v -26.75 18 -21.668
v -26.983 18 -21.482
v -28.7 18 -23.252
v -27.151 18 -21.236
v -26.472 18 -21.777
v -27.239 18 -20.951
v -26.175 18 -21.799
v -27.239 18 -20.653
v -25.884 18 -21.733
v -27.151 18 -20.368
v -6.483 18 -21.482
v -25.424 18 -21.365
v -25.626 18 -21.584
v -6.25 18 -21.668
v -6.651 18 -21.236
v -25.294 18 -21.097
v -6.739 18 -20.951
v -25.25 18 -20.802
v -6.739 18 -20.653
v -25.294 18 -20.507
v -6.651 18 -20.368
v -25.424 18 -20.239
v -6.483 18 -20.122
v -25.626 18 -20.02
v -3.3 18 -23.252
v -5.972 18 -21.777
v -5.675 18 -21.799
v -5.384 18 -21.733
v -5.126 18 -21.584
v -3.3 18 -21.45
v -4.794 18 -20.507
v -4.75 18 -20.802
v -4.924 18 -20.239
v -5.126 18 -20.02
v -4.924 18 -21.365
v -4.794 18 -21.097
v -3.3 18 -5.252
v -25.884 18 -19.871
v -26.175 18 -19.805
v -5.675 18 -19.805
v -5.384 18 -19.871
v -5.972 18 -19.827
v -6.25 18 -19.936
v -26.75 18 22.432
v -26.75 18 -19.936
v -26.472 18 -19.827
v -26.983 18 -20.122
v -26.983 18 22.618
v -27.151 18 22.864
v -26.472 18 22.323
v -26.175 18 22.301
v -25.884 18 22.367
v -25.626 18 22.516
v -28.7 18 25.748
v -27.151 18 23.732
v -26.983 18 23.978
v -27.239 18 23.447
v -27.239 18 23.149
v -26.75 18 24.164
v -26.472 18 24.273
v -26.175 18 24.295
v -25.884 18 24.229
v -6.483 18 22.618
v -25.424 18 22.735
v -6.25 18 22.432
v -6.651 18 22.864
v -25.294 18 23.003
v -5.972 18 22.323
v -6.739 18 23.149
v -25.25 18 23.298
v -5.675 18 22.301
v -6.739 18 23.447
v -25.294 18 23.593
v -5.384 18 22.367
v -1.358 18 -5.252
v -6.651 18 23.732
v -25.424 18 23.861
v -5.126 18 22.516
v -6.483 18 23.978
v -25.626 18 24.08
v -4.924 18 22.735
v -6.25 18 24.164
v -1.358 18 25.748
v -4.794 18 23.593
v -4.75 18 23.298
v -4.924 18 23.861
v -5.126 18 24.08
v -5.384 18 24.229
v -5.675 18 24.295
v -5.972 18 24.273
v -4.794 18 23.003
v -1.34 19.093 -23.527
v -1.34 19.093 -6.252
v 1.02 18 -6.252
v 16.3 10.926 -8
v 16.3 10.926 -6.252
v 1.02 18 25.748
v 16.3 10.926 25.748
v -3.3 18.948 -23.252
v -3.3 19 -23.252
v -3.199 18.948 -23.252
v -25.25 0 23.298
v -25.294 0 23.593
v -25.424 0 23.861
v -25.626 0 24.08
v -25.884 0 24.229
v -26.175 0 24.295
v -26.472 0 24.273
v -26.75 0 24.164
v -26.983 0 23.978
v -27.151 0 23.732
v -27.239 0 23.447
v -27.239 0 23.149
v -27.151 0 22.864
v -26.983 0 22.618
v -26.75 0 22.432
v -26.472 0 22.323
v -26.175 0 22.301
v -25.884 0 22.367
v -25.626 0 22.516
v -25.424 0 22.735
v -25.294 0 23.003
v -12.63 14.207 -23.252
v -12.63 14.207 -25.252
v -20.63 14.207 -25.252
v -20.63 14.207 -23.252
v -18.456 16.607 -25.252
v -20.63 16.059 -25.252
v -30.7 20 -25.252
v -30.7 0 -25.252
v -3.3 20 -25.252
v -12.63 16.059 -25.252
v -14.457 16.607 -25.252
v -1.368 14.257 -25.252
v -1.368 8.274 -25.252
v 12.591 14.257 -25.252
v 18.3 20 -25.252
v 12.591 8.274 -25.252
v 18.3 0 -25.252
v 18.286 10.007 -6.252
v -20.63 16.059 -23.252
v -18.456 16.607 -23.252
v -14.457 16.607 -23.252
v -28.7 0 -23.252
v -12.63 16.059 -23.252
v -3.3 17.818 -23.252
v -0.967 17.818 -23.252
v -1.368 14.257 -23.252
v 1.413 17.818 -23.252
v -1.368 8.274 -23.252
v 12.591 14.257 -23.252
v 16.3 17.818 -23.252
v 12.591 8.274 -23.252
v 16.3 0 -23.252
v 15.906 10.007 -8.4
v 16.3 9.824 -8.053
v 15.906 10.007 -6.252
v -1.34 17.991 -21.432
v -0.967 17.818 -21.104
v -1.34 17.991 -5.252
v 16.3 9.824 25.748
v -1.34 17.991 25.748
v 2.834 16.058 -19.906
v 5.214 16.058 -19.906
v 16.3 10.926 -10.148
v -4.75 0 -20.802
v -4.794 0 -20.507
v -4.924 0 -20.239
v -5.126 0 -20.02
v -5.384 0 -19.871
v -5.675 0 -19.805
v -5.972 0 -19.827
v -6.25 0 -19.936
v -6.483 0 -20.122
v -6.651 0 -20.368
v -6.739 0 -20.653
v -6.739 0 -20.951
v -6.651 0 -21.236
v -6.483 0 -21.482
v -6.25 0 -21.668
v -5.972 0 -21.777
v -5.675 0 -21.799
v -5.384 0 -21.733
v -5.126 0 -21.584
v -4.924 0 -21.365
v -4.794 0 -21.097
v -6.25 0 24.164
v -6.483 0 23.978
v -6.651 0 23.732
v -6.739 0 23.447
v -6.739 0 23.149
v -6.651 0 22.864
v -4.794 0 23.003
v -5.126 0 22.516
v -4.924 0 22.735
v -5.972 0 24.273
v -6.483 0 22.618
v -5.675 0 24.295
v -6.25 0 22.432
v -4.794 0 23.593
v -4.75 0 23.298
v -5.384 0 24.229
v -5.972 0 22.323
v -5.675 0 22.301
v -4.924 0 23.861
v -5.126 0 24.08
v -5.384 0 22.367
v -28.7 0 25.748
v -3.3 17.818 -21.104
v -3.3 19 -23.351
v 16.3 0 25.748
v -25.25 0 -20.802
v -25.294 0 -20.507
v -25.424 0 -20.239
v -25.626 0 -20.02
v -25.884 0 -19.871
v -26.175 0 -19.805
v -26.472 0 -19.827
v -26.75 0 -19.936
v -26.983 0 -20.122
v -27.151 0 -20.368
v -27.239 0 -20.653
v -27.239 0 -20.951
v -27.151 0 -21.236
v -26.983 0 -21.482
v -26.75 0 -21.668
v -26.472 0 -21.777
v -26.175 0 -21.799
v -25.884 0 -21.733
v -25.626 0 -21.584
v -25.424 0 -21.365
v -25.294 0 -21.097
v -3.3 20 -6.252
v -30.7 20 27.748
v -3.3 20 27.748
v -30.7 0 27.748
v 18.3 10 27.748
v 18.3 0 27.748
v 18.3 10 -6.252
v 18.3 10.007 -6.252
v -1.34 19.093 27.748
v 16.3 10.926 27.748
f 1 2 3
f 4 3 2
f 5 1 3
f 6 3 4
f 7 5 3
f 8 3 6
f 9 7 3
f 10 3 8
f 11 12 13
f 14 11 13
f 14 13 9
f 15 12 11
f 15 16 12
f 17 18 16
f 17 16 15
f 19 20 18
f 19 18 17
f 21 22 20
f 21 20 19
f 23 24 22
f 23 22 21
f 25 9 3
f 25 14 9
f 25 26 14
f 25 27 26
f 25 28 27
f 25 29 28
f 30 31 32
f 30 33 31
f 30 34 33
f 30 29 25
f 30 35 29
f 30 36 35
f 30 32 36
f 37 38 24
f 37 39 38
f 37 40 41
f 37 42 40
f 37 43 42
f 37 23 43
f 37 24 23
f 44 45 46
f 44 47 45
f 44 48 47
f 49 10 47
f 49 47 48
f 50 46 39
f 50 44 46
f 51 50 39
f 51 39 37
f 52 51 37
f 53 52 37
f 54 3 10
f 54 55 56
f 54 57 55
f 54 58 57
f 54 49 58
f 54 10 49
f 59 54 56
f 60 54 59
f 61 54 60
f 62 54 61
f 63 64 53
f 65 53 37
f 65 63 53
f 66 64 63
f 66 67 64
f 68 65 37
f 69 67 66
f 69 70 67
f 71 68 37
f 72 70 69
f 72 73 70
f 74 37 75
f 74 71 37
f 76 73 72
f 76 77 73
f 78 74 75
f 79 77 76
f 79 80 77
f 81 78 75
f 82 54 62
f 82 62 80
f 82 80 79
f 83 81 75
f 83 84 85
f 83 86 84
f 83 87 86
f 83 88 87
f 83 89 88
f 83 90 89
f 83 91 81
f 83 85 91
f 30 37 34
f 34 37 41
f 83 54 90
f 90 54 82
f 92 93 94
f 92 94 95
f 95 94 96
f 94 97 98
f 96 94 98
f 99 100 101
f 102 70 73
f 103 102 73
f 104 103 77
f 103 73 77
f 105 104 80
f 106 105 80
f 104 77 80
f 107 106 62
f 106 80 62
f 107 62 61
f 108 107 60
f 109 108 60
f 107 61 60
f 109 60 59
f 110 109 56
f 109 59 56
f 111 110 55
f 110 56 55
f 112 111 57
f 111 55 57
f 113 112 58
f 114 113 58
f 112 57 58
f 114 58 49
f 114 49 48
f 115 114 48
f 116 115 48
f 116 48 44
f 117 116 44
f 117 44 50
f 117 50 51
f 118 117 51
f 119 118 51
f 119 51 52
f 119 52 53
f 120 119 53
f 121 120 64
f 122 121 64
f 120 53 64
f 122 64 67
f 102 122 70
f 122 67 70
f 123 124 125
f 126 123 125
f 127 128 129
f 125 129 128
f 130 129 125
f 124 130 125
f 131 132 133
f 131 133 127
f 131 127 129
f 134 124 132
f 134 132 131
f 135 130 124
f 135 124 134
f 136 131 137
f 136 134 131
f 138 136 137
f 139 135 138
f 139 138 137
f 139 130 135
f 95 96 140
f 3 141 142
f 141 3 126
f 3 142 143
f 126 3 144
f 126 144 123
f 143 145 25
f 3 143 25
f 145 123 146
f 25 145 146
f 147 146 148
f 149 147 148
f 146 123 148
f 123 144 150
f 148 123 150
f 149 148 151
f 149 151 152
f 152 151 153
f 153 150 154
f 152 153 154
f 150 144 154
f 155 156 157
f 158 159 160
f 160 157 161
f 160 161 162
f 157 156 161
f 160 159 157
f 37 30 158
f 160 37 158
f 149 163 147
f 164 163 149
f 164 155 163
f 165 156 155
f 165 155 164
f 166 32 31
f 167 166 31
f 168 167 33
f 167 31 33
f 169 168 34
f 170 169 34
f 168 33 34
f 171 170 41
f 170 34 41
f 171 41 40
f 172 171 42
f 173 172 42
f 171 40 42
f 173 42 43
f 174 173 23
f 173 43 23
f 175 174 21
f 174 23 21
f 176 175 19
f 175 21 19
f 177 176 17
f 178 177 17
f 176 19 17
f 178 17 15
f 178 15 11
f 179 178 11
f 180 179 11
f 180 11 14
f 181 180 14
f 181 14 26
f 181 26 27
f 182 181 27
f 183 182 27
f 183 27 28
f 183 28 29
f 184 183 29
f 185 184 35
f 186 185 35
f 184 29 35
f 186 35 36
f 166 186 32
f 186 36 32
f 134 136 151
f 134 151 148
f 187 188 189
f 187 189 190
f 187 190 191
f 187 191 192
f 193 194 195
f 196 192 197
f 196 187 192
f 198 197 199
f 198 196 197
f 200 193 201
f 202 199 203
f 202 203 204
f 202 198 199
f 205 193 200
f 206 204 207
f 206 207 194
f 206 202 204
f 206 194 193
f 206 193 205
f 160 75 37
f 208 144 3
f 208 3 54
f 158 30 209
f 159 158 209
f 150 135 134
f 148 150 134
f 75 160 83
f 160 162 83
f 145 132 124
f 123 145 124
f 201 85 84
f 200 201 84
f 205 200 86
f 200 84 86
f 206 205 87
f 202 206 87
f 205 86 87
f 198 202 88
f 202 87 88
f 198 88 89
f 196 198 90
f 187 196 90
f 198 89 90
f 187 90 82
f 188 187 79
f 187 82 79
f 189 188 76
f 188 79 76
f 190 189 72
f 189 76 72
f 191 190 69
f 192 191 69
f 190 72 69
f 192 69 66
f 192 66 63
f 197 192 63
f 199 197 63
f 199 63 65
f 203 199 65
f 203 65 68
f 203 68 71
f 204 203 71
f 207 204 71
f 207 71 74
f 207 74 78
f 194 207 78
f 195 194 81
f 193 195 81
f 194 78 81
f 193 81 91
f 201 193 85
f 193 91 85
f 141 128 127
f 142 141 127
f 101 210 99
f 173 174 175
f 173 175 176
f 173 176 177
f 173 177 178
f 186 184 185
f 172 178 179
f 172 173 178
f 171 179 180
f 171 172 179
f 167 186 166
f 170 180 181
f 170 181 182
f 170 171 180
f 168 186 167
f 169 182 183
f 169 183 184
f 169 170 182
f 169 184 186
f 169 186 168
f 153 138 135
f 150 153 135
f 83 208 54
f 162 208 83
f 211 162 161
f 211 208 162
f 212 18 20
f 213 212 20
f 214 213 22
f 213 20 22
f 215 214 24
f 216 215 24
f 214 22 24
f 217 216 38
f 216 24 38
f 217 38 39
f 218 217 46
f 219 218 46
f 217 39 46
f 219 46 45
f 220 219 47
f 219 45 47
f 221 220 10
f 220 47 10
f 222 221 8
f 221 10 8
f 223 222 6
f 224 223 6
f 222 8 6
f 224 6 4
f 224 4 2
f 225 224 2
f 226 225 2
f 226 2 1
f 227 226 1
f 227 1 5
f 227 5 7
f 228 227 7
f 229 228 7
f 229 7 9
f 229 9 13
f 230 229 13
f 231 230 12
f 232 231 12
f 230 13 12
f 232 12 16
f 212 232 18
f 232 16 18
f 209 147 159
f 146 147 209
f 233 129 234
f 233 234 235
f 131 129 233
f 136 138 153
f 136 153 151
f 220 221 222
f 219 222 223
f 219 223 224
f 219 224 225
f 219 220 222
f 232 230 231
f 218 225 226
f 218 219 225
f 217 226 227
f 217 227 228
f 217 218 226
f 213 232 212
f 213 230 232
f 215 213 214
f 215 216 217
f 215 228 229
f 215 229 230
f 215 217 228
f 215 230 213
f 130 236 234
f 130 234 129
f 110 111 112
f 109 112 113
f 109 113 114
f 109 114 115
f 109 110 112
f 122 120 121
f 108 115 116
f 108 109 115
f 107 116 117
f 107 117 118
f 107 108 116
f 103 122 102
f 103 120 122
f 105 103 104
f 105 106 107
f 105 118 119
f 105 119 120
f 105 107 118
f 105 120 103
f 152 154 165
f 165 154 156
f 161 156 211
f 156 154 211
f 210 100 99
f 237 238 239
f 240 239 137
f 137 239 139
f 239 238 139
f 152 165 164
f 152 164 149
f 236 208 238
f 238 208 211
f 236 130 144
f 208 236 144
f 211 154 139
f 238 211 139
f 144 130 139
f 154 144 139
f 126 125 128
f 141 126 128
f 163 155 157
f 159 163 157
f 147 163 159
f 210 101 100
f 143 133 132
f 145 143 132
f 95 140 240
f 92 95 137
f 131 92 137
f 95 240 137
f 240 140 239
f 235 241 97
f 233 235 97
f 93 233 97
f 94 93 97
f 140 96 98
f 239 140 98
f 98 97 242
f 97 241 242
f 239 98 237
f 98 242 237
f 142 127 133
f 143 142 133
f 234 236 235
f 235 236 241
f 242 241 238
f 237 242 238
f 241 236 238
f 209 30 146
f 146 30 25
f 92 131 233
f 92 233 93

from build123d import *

# Parameters (mm, degrees)
SKETCH1_W           = 49
SKETCH1_H           = 53
BOSS_EXTRUDE1_DEPTH = 20
SKETCH3_W           = 45
SKETCH3_H           = 49
CUT_EXTRUDE1_DEPTH  = 18
CUT_EXTRUDE2_DEPTH  = 34
CUT_EXTRUDE3_DEPTH  = 21.6
BOSS_EXTRUDE4_DEPTH = 53
BOSS_EXTRUDE5_DEPTH = 21.6
CUT_EXTRUDE4_DEPTH  = 18
CUT_EXTRUDE5_DEPTH  = 18
BOSS_EXTRUDE6_DEPTH = 18
SKETCH16_R          = 1
BOSS_EXTRUDE7_DEPTH = 18
SKETCH17_W          = 13.959273649
SKETCH17_H          = 5.98254585
CUT_EXTRUDE7_DEPTH  = 2


with BuildPart() as part:
    # Sketch1 → Boss-Extrude1 (new body)
    with BuildSketch(Plane(origin=(0, 0, 0), x_dir=(1, 0, 0), z_dir=(0, 1, 0))):
        with Locations((-6.199798715, -1.247894993)):
            Rectangle(SKETCH1_W, SKETCH1_H)
    extrude(amount=BOSS_EXTRUDE1_DEPTH)

    # Sketch3 → Cut-Extrude1 (cut)
    with BuildSketch(Plane.XZ):
        with Locations((-6.199798715, 1.247894993)):
            Rectangle(SKETCH3_W, SKETCH3_H)
    extrude(amount=-CUT_EXTRUDE1_DEPTH, mode=Mode.SUBTRACT)

    # Sketch4 → Cut-Extrude2 (cut)
    with BuildSketch(Plane.XY.offset(27.747894993)):
        Polygon((18.300201285, 20), (-3.299798715, 20), (18.300201285, 10), align=None)
    extrude(amount=-CUT_EXTRUDE2_DEPTH, mode=Mode.SUBTRACT)

    # Sketch6 → Cut-Extrude3 (cut)
    with BuildSketch(Plane(origin=(18.300201285, 0, 0), x_dir=(0, 0, -1), z_dir=(1, 0, 0))):
        Polygon((6.252105007, 10.006685103), (25.252105007, 20), (6.252105007, 20), align=None)
    extrude(amount=-CUT_EXTRUDE3_DEPTH, mode=Mode.SUBTRACT)

    # Sketch8 → Boss-Extrude4 (add)
    with BuildSketch(Plane.XY.offset(27.747894993)):
        Polygon((-1.339670196, 17.990564534), (-3.299798715, 19), (-3.299798715, 20), (-1.339670196, 19.092533093), (16.300201285, 10.925925926), (18.300201285, 10), (18.300201285, 8.793988713), (16.300201285, 9.823957367), align=None)
    extrude(amount=-BOSS_EXTRUDE4_DEPTH)

    # Sketch11 → Boss-Extrude5 (add)
    with BuildSketch(Plane(origin=(18.300201285, 0, 0), x_dir=(0, 0, -1), z_dir=(1, 0, 0))):
        Polygon((25.252105007, 20), (6.252105007, 10.006685103), (8.400320892, 10.006685103), (25.252105007, 18.870115905), align=None)
    extrude(amount=-BOSS_EXTRUDE5_DEPTH)

    # Sketch12 → Cut-Extrude4 (cut)
    with BuildSketch(Plane.XY.offset(-23.252105007)):
        Polygon((-3.299798715, 17.818188021), (-3.299798715, 10.006685103), (15.905509375, 10.006685103), (-0.967336928, 17.818188021), align=None)
    extrude(amount=CUT_EXTRUDE4_DEPTH, mode=Mode.SUBTRACT)

    # Sketch13 → Cut-Extrude5 (cut)
    with BuildSketch(Plane.ZY.offset(-16.300201285)):
        Polygon((-23.252105007, 17.818188021), (-23.252105007, 9.823957367), (-19.905888942, 9.823957367), (-8.052905944, 9.823957367), (-19.905888942, 16.058199029), align=None)
    extrude(amount=CUT_EXTRUDE5_DEPTH, mode=Mode.SUBTRACT)

    # Sketch15 → Boss-Extrude6 (add)
    with BuildSketch(Plane.XY.offset(-23.252105007)):
        Polygon((-3.299798715, 19), (-3.299798715, 18), (-1.339670196, 17.990564534), align=None)
    extrude(amount=BOSS_EXTRUDE6_DEPTH)

    # Sketch16 → Boss-Extrude7 (add)
    with BuildSketch(Plane.XZ.offset(-18)):
        with Locations((-26.249798715, 23.297894993)):
            Circle(SKETCH16_R)
        with Locations((-5.749798715, 23.297894993)):
            Circle(SKETCH16_R)
        with Locations((-26.249798715, -20.802105007)):
            Circle(SKETCH16_R)
        with Locations((-5.749798715, -20.802105007)):
            Circle(SKETCH16_R)
    extrude(amount=BOSS_EXTRUDE7_DEPTH)

    # Sketch17 → Cut-Extrude7 (cut)
    with BuildSketch(Plane(origin=(0, 0, -25.252105007), x_dir=(-1, 0, 0), z_dir=(0, 0, -1))):
        Polygon((14.456637368, 16.607010477), (12.63034375, 16.059122392), (12.63034375, 14.207010477), (20.63034375, 14.207010477), (20.63034375, 16.059122392), (18.456257111, 16.607010477), align=None)
        with Locations((-5.611259633, 11.265470537)):
            Rectangle(SKETCH17_W, SKETCH17_H)
    extrude(amount=-CUT_EXTRUDE7_DEPTH, mode=Mode.SUBTRACT)


solid = part.part
